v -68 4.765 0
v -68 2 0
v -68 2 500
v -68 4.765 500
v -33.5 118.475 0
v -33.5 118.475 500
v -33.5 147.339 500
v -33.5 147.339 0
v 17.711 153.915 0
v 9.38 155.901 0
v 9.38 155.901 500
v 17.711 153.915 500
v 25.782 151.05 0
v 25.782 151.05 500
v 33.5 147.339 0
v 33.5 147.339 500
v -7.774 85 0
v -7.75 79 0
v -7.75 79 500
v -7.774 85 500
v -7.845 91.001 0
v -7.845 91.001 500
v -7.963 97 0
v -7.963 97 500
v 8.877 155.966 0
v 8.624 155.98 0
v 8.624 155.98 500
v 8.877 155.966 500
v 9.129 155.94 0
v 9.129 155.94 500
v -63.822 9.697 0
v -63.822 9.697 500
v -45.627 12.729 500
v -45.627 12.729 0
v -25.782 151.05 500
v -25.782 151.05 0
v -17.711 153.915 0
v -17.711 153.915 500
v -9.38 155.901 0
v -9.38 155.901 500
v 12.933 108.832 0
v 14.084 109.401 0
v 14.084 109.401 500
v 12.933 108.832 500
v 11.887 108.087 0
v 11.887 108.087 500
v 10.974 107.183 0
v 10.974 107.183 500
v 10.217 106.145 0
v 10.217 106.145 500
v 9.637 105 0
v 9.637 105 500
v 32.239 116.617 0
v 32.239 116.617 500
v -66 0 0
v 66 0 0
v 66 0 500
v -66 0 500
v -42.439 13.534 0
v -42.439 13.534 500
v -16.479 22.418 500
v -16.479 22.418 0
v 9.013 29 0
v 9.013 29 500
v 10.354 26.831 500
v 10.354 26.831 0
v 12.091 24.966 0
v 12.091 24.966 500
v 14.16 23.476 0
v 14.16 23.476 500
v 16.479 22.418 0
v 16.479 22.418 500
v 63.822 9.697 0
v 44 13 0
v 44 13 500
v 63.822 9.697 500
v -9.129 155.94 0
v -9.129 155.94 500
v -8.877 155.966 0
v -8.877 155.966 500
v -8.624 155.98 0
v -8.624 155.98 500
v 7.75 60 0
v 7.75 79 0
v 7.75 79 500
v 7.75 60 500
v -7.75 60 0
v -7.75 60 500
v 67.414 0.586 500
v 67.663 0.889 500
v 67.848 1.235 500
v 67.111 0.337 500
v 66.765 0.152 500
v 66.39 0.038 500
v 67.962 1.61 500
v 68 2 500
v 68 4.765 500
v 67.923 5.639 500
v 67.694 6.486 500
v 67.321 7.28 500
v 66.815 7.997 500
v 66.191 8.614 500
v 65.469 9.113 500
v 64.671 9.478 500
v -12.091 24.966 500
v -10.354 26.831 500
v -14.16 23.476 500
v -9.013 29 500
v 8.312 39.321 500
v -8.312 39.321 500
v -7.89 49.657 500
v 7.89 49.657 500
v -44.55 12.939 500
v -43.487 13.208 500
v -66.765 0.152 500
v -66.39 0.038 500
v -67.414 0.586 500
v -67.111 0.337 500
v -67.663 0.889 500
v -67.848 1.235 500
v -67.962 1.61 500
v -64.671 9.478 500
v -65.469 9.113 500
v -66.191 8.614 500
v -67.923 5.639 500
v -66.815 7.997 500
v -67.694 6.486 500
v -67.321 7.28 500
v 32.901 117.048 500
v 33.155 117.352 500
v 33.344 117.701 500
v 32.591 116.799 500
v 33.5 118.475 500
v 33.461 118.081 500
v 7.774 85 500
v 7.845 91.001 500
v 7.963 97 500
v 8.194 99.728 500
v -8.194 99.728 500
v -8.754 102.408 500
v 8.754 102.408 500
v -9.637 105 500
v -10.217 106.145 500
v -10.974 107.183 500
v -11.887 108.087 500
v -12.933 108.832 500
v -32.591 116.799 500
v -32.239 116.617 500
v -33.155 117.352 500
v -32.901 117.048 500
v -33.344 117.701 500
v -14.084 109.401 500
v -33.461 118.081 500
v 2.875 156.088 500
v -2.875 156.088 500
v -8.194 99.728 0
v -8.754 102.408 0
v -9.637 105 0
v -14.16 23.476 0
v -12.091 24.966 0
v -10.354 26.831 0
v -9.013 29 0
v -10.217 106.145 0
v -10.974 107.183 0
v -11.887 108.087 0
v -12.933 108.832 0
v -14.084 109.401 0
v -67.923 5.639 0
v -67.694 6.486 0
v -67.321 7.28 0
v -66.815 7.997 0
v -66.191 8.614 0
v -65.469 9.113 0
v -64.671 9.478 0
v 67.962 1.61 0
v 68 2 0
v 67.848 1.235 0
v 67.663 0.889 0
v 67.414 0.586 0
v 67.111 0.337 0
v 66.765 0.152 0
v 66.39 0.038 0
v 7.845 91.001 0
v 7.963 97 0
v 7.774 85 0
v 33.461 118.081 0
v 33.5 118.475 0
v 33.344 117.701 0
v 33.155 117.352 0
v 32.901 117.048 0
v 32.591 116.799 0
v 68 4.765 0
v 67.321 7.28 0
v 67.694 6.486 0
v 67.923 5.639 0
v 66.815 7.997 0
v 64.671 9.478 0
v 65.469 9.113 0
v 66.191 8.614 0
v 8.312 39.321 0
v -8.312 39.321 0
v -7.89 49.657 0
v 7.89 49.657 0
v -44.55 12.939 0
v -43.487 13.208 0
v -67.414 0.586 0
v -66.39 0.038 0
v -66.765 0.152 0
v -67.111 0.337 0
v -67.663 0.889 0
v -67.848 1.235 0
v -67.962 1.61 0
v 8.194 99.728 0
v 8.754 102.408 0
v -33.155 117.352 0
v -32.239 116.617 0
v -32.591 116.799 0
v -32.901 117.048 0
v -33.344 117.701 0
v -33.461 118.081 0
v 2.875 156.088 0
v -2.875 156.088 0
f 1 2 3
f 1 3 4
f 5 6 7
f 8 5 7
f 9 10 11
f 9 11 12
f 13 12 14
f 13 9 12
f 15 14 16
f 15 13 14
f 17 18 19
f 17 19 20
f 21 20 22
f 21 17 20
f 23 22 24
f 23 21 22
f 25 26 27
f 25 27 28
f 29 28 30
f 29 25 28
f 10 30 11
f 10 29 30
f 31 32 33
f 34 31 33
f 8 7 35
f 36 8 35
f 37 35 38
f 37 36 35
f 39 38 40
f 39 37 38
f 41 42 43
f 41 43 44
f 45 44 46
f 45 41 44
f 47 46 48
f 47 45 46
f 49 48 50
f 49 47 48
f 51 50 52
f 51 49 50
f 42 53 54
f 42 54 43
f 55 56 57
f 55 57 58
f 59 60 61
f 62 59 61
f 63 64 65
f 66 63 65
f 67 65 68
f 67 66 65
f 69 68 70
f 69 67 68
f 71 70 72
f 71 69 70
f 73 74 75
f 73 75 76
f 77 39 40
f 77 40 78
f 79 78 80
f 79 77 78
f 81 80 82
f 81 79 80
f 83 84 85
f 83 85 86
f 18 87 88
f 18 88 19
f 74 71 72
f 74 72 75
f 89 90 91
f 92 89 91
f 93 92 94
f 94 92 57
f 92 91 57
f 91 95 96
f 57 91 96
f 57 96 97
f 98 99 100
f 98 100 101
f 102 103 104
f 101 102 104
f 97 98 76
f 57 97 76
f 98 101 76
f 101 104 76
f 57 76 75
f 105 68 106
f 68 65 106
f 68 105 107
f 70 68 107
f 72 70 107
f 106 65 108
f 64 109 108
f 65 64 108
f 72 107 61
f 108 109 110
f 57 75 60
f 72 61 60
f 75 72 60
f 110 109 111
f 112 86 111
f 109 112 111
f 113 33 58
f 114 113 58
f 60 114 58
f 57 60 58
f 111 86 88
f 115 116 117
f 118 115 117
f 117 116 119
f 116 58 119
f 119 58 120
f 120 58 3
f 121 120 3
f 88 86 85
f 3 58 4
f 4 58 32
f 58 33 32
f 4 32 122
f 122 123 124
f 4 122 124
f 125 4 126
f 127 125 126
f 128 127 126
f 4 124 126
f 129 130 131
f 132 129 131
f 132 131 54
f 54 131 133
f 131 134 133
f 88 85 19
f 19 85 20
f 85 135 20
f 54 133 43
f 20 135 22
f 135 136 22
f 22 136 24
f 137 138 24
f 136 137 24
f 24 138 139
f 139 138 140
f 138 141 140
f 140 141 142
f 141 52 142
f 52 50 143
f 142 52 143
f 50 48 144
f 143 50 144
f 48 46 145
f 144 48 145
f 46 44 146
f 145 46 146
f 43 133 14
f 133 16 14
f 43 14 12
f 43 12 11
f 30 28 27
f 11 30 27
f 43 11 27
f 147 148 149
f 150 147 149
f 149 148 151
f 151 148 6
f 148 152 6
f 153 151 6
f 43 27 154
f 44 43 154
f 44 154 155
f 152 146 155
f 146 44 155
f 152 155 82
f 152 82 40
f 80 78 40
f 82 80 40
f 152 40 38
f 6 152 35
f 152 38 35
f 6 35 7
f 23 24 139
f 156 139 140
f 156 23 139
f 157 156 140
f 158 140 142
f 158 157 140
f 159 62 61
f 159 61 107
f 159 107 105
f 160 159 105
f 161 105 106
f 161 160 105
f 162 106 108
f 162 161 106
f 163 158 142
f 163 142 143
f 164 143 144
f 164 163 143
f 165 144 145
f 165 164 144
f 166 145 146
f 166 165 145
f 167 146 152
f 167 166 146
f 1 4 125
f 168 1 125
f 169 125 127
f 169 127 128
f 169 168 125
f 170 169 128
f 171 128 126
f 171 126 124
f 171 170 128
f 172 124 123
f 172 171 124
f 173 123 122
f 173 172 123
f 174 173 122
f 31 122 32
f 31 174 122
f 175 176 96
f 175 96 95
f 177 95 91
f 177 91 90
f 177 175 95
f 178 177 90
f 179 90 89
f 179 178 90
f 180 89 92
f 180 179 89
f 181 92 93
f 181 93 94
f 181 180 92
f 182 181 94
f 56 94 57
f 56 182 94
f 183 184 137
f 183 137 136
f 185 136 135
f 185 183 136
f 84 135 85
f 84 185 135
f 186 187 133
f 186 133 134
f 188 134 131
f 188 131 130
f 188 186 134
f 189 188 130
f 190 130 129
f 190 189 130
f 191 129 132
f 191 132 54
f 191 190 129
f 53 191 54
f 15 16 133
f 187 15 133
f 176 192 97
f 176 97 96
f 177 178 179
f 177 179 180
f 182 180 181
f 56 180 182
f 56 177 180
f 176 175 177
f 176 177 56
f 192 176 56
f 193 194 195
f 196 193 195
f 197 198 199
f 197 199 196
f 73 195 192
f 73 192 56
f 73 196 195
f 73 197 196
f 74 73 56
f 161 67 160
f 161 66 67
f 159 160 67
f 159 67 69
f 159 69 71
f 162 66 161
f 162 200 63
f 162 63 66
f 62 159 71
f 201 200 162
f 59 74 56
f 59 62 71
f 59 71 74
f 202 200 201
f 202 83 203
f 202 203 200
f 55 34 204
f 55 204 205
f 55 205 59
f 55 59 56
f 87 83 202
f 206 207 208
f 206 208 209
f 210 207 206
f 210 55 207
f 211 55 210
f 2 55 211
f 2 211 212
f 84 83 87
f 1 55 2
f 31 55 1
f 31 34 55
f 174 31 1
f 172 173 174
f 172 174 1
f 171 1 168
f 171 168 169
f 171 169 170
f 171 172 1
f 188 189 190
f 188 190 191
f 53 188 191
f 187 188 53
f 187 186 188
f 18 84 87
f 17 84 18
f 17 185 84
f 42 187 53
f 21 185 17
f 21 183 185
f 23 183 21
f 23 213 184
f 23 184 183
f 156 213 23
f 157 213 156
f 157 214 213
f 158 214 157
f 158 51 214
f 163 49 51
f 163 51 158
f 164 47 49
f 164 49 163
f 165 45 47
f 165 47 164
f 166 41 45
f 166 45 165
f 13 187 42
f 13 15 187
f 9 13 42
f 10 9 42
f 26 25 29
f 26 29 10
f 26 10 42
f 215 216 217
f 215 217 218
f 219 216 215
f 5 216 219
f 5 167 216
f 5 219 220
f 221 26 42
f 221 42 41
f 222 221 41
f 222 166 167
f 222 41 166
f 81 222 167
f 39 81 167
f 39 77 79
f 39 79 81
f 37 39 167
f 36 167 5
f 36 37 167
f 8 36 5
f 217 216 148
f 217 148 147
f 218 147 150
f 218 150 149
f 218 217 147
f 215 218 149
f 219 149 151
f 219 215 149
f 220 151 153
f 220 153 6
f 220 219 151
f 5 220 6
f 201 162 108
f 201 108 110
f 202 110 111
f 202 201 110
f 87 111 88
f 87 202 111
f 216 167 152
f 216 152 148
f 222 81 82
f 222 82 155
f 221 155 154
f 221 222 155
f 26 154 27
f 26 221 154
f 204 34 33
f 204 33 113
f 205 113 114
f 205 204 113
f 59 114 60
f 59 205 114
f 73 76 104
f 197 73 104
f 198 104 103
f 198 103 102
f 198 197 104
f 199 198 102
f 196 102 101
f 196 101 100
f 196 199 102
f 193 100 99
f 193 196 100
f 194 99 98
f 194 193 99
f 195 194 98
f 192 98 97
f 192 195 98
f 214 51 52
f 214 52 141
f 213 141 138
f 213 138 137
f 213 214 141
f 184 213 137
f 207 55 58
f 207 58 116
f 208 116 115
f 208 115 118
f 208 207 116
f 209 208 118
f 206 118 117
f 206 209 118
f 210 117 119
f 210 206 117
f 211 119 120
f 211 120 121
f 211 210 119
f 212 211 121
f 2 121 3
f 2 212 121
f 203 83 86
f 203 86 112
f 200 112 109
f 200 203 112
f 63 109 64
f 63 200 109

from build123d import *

# Parameters (mm, degrees)
BOSS_EXTRUDE1_DEPTH = 500


with BuildPart() as part:
    # Sketch3 → Boss-Extrude1 (new body)
    with BuildSketch(Plane.XY):
        with BuildLine():
            Line((0, 0), (-66, 0))
            ThreePointArc((-66, 0), (-67.414213562, 0.585786438), (-68, 2))
            Line((-68, 2), (-68, 4.765190248))
            ThreePointArc((-68, 4.765190248), (-66.815034418, 7.997142041), (-63.821795043, 9.697193178))
            Line((-63.821795043, 9.697193178), (-45.627404821, 12.72883365))
            ThreePointArc((-45.627404821, 12.72883365), (-44.016636876, 13.065865401), (-42.439030045, 13.534182026))
            Line((-42.439030045, 13.534182026), (-16.479262031, 22.417915838))
            ThreePointArc((-16.479262031, 22.417915838), (-12.091385863, 24.966143716), (-9.013249079, 29))
            ThreePointArc((-9.013249079, 29), (-8.065943267, 44.487135998), (-7.75, 60))
            Line((-7.75, 60), (-7.75, 79))
            ThreePointArc((-7.75, 79), (-7.803158877, 88.000627905), (-7.962628091, 97))
            ThreePointArc((-7.962628091, 97), (-8.43329292, 101.07664564), (-9.636561641, 105))
            ThreePointArc((-9.636561641, 105), (-11.41229559, 107.653272086), (-14.084201862, 109.400842023))
            Line((-14.084201862, 109.400842023), (-32.238737772, 116.616858833))
            ThreePointArc((-32.238737772, 116.616858833), (-33.154913222, 117.352365228), (-33.5, 118.475424545))
            Line((-33.5, 118.475424545), (-33.5, 147.339300155))
            ThreePointArc((-33.5, 147.339300155), (-21.78437547, 152.590959224), (-9.379525087, 155.900863764))
            ThreePointArc((-9.379525087, 155.900863764), (-9.003111167, 155.954824325), (-8.623684969, 155.980022357))
            ThreePointArc((-8.623684969, 155.980022357), (0, 156.101961392), (8.623684969, 155.980022357))
            ThreePointArc((8.623684969, 155.980022357), (9.003111167, 155.954824325), (9.379525087, 155.900863764))
            ThreePointArc((9.379525087, 155.900863764), (21.78437547, 152.590959224), (33.5, 147.339300155))
            Line((33.5, 147.339300155), (33.5, 118.475424545))
            ThreePointArc((33.5, 118.475424545), (33.154913222, 117.352365228), (32.238737772, 116.616858833))
            Line((32.238737772, 116.616858833), (14.084201862, 109.400842023))
            ThreePointArc((14.084201862, 109.400842023), (11.41229559, 107.653272086), (9.636561641, 105))
            ThreePointArc((9.636561641, 105), (8.43329292, 101.07664564), (7.962628091, 97))
            ThreePointArc((7.962628091, 97), (7.803158877, 88.000627905), (7.75, 79))
            Line((7.75, 79), (7.75, 60))
            ThreePointArc((7.75, 60), (8.065943267, 44.487135998), (9.013249079, 29))
            ThreePointArc((9.013249079, 29), (12.091385863, 24.966143716), (16.479262031, 22.417915838))
            Line((16.479262031, 22.417915838), (44, 12.999999996))
            Line((44, 12.999999996), (63.821795043, 9.697193178))
            ThreePointArc((63.821795043, 9.697193178), (66.815034418, 7.997142041), (68, 4.765190248))
            Line((68, 4.765190248), (68, 2))
            ThreePointArc((68, 2), (67.414213562, 0.585786438), (66, 0))
            Line((66, 0), (0, 0))
        make_face()
    extrude(amount=BOSS_EXTRUDE1_DEPTH)


solid = part.part
